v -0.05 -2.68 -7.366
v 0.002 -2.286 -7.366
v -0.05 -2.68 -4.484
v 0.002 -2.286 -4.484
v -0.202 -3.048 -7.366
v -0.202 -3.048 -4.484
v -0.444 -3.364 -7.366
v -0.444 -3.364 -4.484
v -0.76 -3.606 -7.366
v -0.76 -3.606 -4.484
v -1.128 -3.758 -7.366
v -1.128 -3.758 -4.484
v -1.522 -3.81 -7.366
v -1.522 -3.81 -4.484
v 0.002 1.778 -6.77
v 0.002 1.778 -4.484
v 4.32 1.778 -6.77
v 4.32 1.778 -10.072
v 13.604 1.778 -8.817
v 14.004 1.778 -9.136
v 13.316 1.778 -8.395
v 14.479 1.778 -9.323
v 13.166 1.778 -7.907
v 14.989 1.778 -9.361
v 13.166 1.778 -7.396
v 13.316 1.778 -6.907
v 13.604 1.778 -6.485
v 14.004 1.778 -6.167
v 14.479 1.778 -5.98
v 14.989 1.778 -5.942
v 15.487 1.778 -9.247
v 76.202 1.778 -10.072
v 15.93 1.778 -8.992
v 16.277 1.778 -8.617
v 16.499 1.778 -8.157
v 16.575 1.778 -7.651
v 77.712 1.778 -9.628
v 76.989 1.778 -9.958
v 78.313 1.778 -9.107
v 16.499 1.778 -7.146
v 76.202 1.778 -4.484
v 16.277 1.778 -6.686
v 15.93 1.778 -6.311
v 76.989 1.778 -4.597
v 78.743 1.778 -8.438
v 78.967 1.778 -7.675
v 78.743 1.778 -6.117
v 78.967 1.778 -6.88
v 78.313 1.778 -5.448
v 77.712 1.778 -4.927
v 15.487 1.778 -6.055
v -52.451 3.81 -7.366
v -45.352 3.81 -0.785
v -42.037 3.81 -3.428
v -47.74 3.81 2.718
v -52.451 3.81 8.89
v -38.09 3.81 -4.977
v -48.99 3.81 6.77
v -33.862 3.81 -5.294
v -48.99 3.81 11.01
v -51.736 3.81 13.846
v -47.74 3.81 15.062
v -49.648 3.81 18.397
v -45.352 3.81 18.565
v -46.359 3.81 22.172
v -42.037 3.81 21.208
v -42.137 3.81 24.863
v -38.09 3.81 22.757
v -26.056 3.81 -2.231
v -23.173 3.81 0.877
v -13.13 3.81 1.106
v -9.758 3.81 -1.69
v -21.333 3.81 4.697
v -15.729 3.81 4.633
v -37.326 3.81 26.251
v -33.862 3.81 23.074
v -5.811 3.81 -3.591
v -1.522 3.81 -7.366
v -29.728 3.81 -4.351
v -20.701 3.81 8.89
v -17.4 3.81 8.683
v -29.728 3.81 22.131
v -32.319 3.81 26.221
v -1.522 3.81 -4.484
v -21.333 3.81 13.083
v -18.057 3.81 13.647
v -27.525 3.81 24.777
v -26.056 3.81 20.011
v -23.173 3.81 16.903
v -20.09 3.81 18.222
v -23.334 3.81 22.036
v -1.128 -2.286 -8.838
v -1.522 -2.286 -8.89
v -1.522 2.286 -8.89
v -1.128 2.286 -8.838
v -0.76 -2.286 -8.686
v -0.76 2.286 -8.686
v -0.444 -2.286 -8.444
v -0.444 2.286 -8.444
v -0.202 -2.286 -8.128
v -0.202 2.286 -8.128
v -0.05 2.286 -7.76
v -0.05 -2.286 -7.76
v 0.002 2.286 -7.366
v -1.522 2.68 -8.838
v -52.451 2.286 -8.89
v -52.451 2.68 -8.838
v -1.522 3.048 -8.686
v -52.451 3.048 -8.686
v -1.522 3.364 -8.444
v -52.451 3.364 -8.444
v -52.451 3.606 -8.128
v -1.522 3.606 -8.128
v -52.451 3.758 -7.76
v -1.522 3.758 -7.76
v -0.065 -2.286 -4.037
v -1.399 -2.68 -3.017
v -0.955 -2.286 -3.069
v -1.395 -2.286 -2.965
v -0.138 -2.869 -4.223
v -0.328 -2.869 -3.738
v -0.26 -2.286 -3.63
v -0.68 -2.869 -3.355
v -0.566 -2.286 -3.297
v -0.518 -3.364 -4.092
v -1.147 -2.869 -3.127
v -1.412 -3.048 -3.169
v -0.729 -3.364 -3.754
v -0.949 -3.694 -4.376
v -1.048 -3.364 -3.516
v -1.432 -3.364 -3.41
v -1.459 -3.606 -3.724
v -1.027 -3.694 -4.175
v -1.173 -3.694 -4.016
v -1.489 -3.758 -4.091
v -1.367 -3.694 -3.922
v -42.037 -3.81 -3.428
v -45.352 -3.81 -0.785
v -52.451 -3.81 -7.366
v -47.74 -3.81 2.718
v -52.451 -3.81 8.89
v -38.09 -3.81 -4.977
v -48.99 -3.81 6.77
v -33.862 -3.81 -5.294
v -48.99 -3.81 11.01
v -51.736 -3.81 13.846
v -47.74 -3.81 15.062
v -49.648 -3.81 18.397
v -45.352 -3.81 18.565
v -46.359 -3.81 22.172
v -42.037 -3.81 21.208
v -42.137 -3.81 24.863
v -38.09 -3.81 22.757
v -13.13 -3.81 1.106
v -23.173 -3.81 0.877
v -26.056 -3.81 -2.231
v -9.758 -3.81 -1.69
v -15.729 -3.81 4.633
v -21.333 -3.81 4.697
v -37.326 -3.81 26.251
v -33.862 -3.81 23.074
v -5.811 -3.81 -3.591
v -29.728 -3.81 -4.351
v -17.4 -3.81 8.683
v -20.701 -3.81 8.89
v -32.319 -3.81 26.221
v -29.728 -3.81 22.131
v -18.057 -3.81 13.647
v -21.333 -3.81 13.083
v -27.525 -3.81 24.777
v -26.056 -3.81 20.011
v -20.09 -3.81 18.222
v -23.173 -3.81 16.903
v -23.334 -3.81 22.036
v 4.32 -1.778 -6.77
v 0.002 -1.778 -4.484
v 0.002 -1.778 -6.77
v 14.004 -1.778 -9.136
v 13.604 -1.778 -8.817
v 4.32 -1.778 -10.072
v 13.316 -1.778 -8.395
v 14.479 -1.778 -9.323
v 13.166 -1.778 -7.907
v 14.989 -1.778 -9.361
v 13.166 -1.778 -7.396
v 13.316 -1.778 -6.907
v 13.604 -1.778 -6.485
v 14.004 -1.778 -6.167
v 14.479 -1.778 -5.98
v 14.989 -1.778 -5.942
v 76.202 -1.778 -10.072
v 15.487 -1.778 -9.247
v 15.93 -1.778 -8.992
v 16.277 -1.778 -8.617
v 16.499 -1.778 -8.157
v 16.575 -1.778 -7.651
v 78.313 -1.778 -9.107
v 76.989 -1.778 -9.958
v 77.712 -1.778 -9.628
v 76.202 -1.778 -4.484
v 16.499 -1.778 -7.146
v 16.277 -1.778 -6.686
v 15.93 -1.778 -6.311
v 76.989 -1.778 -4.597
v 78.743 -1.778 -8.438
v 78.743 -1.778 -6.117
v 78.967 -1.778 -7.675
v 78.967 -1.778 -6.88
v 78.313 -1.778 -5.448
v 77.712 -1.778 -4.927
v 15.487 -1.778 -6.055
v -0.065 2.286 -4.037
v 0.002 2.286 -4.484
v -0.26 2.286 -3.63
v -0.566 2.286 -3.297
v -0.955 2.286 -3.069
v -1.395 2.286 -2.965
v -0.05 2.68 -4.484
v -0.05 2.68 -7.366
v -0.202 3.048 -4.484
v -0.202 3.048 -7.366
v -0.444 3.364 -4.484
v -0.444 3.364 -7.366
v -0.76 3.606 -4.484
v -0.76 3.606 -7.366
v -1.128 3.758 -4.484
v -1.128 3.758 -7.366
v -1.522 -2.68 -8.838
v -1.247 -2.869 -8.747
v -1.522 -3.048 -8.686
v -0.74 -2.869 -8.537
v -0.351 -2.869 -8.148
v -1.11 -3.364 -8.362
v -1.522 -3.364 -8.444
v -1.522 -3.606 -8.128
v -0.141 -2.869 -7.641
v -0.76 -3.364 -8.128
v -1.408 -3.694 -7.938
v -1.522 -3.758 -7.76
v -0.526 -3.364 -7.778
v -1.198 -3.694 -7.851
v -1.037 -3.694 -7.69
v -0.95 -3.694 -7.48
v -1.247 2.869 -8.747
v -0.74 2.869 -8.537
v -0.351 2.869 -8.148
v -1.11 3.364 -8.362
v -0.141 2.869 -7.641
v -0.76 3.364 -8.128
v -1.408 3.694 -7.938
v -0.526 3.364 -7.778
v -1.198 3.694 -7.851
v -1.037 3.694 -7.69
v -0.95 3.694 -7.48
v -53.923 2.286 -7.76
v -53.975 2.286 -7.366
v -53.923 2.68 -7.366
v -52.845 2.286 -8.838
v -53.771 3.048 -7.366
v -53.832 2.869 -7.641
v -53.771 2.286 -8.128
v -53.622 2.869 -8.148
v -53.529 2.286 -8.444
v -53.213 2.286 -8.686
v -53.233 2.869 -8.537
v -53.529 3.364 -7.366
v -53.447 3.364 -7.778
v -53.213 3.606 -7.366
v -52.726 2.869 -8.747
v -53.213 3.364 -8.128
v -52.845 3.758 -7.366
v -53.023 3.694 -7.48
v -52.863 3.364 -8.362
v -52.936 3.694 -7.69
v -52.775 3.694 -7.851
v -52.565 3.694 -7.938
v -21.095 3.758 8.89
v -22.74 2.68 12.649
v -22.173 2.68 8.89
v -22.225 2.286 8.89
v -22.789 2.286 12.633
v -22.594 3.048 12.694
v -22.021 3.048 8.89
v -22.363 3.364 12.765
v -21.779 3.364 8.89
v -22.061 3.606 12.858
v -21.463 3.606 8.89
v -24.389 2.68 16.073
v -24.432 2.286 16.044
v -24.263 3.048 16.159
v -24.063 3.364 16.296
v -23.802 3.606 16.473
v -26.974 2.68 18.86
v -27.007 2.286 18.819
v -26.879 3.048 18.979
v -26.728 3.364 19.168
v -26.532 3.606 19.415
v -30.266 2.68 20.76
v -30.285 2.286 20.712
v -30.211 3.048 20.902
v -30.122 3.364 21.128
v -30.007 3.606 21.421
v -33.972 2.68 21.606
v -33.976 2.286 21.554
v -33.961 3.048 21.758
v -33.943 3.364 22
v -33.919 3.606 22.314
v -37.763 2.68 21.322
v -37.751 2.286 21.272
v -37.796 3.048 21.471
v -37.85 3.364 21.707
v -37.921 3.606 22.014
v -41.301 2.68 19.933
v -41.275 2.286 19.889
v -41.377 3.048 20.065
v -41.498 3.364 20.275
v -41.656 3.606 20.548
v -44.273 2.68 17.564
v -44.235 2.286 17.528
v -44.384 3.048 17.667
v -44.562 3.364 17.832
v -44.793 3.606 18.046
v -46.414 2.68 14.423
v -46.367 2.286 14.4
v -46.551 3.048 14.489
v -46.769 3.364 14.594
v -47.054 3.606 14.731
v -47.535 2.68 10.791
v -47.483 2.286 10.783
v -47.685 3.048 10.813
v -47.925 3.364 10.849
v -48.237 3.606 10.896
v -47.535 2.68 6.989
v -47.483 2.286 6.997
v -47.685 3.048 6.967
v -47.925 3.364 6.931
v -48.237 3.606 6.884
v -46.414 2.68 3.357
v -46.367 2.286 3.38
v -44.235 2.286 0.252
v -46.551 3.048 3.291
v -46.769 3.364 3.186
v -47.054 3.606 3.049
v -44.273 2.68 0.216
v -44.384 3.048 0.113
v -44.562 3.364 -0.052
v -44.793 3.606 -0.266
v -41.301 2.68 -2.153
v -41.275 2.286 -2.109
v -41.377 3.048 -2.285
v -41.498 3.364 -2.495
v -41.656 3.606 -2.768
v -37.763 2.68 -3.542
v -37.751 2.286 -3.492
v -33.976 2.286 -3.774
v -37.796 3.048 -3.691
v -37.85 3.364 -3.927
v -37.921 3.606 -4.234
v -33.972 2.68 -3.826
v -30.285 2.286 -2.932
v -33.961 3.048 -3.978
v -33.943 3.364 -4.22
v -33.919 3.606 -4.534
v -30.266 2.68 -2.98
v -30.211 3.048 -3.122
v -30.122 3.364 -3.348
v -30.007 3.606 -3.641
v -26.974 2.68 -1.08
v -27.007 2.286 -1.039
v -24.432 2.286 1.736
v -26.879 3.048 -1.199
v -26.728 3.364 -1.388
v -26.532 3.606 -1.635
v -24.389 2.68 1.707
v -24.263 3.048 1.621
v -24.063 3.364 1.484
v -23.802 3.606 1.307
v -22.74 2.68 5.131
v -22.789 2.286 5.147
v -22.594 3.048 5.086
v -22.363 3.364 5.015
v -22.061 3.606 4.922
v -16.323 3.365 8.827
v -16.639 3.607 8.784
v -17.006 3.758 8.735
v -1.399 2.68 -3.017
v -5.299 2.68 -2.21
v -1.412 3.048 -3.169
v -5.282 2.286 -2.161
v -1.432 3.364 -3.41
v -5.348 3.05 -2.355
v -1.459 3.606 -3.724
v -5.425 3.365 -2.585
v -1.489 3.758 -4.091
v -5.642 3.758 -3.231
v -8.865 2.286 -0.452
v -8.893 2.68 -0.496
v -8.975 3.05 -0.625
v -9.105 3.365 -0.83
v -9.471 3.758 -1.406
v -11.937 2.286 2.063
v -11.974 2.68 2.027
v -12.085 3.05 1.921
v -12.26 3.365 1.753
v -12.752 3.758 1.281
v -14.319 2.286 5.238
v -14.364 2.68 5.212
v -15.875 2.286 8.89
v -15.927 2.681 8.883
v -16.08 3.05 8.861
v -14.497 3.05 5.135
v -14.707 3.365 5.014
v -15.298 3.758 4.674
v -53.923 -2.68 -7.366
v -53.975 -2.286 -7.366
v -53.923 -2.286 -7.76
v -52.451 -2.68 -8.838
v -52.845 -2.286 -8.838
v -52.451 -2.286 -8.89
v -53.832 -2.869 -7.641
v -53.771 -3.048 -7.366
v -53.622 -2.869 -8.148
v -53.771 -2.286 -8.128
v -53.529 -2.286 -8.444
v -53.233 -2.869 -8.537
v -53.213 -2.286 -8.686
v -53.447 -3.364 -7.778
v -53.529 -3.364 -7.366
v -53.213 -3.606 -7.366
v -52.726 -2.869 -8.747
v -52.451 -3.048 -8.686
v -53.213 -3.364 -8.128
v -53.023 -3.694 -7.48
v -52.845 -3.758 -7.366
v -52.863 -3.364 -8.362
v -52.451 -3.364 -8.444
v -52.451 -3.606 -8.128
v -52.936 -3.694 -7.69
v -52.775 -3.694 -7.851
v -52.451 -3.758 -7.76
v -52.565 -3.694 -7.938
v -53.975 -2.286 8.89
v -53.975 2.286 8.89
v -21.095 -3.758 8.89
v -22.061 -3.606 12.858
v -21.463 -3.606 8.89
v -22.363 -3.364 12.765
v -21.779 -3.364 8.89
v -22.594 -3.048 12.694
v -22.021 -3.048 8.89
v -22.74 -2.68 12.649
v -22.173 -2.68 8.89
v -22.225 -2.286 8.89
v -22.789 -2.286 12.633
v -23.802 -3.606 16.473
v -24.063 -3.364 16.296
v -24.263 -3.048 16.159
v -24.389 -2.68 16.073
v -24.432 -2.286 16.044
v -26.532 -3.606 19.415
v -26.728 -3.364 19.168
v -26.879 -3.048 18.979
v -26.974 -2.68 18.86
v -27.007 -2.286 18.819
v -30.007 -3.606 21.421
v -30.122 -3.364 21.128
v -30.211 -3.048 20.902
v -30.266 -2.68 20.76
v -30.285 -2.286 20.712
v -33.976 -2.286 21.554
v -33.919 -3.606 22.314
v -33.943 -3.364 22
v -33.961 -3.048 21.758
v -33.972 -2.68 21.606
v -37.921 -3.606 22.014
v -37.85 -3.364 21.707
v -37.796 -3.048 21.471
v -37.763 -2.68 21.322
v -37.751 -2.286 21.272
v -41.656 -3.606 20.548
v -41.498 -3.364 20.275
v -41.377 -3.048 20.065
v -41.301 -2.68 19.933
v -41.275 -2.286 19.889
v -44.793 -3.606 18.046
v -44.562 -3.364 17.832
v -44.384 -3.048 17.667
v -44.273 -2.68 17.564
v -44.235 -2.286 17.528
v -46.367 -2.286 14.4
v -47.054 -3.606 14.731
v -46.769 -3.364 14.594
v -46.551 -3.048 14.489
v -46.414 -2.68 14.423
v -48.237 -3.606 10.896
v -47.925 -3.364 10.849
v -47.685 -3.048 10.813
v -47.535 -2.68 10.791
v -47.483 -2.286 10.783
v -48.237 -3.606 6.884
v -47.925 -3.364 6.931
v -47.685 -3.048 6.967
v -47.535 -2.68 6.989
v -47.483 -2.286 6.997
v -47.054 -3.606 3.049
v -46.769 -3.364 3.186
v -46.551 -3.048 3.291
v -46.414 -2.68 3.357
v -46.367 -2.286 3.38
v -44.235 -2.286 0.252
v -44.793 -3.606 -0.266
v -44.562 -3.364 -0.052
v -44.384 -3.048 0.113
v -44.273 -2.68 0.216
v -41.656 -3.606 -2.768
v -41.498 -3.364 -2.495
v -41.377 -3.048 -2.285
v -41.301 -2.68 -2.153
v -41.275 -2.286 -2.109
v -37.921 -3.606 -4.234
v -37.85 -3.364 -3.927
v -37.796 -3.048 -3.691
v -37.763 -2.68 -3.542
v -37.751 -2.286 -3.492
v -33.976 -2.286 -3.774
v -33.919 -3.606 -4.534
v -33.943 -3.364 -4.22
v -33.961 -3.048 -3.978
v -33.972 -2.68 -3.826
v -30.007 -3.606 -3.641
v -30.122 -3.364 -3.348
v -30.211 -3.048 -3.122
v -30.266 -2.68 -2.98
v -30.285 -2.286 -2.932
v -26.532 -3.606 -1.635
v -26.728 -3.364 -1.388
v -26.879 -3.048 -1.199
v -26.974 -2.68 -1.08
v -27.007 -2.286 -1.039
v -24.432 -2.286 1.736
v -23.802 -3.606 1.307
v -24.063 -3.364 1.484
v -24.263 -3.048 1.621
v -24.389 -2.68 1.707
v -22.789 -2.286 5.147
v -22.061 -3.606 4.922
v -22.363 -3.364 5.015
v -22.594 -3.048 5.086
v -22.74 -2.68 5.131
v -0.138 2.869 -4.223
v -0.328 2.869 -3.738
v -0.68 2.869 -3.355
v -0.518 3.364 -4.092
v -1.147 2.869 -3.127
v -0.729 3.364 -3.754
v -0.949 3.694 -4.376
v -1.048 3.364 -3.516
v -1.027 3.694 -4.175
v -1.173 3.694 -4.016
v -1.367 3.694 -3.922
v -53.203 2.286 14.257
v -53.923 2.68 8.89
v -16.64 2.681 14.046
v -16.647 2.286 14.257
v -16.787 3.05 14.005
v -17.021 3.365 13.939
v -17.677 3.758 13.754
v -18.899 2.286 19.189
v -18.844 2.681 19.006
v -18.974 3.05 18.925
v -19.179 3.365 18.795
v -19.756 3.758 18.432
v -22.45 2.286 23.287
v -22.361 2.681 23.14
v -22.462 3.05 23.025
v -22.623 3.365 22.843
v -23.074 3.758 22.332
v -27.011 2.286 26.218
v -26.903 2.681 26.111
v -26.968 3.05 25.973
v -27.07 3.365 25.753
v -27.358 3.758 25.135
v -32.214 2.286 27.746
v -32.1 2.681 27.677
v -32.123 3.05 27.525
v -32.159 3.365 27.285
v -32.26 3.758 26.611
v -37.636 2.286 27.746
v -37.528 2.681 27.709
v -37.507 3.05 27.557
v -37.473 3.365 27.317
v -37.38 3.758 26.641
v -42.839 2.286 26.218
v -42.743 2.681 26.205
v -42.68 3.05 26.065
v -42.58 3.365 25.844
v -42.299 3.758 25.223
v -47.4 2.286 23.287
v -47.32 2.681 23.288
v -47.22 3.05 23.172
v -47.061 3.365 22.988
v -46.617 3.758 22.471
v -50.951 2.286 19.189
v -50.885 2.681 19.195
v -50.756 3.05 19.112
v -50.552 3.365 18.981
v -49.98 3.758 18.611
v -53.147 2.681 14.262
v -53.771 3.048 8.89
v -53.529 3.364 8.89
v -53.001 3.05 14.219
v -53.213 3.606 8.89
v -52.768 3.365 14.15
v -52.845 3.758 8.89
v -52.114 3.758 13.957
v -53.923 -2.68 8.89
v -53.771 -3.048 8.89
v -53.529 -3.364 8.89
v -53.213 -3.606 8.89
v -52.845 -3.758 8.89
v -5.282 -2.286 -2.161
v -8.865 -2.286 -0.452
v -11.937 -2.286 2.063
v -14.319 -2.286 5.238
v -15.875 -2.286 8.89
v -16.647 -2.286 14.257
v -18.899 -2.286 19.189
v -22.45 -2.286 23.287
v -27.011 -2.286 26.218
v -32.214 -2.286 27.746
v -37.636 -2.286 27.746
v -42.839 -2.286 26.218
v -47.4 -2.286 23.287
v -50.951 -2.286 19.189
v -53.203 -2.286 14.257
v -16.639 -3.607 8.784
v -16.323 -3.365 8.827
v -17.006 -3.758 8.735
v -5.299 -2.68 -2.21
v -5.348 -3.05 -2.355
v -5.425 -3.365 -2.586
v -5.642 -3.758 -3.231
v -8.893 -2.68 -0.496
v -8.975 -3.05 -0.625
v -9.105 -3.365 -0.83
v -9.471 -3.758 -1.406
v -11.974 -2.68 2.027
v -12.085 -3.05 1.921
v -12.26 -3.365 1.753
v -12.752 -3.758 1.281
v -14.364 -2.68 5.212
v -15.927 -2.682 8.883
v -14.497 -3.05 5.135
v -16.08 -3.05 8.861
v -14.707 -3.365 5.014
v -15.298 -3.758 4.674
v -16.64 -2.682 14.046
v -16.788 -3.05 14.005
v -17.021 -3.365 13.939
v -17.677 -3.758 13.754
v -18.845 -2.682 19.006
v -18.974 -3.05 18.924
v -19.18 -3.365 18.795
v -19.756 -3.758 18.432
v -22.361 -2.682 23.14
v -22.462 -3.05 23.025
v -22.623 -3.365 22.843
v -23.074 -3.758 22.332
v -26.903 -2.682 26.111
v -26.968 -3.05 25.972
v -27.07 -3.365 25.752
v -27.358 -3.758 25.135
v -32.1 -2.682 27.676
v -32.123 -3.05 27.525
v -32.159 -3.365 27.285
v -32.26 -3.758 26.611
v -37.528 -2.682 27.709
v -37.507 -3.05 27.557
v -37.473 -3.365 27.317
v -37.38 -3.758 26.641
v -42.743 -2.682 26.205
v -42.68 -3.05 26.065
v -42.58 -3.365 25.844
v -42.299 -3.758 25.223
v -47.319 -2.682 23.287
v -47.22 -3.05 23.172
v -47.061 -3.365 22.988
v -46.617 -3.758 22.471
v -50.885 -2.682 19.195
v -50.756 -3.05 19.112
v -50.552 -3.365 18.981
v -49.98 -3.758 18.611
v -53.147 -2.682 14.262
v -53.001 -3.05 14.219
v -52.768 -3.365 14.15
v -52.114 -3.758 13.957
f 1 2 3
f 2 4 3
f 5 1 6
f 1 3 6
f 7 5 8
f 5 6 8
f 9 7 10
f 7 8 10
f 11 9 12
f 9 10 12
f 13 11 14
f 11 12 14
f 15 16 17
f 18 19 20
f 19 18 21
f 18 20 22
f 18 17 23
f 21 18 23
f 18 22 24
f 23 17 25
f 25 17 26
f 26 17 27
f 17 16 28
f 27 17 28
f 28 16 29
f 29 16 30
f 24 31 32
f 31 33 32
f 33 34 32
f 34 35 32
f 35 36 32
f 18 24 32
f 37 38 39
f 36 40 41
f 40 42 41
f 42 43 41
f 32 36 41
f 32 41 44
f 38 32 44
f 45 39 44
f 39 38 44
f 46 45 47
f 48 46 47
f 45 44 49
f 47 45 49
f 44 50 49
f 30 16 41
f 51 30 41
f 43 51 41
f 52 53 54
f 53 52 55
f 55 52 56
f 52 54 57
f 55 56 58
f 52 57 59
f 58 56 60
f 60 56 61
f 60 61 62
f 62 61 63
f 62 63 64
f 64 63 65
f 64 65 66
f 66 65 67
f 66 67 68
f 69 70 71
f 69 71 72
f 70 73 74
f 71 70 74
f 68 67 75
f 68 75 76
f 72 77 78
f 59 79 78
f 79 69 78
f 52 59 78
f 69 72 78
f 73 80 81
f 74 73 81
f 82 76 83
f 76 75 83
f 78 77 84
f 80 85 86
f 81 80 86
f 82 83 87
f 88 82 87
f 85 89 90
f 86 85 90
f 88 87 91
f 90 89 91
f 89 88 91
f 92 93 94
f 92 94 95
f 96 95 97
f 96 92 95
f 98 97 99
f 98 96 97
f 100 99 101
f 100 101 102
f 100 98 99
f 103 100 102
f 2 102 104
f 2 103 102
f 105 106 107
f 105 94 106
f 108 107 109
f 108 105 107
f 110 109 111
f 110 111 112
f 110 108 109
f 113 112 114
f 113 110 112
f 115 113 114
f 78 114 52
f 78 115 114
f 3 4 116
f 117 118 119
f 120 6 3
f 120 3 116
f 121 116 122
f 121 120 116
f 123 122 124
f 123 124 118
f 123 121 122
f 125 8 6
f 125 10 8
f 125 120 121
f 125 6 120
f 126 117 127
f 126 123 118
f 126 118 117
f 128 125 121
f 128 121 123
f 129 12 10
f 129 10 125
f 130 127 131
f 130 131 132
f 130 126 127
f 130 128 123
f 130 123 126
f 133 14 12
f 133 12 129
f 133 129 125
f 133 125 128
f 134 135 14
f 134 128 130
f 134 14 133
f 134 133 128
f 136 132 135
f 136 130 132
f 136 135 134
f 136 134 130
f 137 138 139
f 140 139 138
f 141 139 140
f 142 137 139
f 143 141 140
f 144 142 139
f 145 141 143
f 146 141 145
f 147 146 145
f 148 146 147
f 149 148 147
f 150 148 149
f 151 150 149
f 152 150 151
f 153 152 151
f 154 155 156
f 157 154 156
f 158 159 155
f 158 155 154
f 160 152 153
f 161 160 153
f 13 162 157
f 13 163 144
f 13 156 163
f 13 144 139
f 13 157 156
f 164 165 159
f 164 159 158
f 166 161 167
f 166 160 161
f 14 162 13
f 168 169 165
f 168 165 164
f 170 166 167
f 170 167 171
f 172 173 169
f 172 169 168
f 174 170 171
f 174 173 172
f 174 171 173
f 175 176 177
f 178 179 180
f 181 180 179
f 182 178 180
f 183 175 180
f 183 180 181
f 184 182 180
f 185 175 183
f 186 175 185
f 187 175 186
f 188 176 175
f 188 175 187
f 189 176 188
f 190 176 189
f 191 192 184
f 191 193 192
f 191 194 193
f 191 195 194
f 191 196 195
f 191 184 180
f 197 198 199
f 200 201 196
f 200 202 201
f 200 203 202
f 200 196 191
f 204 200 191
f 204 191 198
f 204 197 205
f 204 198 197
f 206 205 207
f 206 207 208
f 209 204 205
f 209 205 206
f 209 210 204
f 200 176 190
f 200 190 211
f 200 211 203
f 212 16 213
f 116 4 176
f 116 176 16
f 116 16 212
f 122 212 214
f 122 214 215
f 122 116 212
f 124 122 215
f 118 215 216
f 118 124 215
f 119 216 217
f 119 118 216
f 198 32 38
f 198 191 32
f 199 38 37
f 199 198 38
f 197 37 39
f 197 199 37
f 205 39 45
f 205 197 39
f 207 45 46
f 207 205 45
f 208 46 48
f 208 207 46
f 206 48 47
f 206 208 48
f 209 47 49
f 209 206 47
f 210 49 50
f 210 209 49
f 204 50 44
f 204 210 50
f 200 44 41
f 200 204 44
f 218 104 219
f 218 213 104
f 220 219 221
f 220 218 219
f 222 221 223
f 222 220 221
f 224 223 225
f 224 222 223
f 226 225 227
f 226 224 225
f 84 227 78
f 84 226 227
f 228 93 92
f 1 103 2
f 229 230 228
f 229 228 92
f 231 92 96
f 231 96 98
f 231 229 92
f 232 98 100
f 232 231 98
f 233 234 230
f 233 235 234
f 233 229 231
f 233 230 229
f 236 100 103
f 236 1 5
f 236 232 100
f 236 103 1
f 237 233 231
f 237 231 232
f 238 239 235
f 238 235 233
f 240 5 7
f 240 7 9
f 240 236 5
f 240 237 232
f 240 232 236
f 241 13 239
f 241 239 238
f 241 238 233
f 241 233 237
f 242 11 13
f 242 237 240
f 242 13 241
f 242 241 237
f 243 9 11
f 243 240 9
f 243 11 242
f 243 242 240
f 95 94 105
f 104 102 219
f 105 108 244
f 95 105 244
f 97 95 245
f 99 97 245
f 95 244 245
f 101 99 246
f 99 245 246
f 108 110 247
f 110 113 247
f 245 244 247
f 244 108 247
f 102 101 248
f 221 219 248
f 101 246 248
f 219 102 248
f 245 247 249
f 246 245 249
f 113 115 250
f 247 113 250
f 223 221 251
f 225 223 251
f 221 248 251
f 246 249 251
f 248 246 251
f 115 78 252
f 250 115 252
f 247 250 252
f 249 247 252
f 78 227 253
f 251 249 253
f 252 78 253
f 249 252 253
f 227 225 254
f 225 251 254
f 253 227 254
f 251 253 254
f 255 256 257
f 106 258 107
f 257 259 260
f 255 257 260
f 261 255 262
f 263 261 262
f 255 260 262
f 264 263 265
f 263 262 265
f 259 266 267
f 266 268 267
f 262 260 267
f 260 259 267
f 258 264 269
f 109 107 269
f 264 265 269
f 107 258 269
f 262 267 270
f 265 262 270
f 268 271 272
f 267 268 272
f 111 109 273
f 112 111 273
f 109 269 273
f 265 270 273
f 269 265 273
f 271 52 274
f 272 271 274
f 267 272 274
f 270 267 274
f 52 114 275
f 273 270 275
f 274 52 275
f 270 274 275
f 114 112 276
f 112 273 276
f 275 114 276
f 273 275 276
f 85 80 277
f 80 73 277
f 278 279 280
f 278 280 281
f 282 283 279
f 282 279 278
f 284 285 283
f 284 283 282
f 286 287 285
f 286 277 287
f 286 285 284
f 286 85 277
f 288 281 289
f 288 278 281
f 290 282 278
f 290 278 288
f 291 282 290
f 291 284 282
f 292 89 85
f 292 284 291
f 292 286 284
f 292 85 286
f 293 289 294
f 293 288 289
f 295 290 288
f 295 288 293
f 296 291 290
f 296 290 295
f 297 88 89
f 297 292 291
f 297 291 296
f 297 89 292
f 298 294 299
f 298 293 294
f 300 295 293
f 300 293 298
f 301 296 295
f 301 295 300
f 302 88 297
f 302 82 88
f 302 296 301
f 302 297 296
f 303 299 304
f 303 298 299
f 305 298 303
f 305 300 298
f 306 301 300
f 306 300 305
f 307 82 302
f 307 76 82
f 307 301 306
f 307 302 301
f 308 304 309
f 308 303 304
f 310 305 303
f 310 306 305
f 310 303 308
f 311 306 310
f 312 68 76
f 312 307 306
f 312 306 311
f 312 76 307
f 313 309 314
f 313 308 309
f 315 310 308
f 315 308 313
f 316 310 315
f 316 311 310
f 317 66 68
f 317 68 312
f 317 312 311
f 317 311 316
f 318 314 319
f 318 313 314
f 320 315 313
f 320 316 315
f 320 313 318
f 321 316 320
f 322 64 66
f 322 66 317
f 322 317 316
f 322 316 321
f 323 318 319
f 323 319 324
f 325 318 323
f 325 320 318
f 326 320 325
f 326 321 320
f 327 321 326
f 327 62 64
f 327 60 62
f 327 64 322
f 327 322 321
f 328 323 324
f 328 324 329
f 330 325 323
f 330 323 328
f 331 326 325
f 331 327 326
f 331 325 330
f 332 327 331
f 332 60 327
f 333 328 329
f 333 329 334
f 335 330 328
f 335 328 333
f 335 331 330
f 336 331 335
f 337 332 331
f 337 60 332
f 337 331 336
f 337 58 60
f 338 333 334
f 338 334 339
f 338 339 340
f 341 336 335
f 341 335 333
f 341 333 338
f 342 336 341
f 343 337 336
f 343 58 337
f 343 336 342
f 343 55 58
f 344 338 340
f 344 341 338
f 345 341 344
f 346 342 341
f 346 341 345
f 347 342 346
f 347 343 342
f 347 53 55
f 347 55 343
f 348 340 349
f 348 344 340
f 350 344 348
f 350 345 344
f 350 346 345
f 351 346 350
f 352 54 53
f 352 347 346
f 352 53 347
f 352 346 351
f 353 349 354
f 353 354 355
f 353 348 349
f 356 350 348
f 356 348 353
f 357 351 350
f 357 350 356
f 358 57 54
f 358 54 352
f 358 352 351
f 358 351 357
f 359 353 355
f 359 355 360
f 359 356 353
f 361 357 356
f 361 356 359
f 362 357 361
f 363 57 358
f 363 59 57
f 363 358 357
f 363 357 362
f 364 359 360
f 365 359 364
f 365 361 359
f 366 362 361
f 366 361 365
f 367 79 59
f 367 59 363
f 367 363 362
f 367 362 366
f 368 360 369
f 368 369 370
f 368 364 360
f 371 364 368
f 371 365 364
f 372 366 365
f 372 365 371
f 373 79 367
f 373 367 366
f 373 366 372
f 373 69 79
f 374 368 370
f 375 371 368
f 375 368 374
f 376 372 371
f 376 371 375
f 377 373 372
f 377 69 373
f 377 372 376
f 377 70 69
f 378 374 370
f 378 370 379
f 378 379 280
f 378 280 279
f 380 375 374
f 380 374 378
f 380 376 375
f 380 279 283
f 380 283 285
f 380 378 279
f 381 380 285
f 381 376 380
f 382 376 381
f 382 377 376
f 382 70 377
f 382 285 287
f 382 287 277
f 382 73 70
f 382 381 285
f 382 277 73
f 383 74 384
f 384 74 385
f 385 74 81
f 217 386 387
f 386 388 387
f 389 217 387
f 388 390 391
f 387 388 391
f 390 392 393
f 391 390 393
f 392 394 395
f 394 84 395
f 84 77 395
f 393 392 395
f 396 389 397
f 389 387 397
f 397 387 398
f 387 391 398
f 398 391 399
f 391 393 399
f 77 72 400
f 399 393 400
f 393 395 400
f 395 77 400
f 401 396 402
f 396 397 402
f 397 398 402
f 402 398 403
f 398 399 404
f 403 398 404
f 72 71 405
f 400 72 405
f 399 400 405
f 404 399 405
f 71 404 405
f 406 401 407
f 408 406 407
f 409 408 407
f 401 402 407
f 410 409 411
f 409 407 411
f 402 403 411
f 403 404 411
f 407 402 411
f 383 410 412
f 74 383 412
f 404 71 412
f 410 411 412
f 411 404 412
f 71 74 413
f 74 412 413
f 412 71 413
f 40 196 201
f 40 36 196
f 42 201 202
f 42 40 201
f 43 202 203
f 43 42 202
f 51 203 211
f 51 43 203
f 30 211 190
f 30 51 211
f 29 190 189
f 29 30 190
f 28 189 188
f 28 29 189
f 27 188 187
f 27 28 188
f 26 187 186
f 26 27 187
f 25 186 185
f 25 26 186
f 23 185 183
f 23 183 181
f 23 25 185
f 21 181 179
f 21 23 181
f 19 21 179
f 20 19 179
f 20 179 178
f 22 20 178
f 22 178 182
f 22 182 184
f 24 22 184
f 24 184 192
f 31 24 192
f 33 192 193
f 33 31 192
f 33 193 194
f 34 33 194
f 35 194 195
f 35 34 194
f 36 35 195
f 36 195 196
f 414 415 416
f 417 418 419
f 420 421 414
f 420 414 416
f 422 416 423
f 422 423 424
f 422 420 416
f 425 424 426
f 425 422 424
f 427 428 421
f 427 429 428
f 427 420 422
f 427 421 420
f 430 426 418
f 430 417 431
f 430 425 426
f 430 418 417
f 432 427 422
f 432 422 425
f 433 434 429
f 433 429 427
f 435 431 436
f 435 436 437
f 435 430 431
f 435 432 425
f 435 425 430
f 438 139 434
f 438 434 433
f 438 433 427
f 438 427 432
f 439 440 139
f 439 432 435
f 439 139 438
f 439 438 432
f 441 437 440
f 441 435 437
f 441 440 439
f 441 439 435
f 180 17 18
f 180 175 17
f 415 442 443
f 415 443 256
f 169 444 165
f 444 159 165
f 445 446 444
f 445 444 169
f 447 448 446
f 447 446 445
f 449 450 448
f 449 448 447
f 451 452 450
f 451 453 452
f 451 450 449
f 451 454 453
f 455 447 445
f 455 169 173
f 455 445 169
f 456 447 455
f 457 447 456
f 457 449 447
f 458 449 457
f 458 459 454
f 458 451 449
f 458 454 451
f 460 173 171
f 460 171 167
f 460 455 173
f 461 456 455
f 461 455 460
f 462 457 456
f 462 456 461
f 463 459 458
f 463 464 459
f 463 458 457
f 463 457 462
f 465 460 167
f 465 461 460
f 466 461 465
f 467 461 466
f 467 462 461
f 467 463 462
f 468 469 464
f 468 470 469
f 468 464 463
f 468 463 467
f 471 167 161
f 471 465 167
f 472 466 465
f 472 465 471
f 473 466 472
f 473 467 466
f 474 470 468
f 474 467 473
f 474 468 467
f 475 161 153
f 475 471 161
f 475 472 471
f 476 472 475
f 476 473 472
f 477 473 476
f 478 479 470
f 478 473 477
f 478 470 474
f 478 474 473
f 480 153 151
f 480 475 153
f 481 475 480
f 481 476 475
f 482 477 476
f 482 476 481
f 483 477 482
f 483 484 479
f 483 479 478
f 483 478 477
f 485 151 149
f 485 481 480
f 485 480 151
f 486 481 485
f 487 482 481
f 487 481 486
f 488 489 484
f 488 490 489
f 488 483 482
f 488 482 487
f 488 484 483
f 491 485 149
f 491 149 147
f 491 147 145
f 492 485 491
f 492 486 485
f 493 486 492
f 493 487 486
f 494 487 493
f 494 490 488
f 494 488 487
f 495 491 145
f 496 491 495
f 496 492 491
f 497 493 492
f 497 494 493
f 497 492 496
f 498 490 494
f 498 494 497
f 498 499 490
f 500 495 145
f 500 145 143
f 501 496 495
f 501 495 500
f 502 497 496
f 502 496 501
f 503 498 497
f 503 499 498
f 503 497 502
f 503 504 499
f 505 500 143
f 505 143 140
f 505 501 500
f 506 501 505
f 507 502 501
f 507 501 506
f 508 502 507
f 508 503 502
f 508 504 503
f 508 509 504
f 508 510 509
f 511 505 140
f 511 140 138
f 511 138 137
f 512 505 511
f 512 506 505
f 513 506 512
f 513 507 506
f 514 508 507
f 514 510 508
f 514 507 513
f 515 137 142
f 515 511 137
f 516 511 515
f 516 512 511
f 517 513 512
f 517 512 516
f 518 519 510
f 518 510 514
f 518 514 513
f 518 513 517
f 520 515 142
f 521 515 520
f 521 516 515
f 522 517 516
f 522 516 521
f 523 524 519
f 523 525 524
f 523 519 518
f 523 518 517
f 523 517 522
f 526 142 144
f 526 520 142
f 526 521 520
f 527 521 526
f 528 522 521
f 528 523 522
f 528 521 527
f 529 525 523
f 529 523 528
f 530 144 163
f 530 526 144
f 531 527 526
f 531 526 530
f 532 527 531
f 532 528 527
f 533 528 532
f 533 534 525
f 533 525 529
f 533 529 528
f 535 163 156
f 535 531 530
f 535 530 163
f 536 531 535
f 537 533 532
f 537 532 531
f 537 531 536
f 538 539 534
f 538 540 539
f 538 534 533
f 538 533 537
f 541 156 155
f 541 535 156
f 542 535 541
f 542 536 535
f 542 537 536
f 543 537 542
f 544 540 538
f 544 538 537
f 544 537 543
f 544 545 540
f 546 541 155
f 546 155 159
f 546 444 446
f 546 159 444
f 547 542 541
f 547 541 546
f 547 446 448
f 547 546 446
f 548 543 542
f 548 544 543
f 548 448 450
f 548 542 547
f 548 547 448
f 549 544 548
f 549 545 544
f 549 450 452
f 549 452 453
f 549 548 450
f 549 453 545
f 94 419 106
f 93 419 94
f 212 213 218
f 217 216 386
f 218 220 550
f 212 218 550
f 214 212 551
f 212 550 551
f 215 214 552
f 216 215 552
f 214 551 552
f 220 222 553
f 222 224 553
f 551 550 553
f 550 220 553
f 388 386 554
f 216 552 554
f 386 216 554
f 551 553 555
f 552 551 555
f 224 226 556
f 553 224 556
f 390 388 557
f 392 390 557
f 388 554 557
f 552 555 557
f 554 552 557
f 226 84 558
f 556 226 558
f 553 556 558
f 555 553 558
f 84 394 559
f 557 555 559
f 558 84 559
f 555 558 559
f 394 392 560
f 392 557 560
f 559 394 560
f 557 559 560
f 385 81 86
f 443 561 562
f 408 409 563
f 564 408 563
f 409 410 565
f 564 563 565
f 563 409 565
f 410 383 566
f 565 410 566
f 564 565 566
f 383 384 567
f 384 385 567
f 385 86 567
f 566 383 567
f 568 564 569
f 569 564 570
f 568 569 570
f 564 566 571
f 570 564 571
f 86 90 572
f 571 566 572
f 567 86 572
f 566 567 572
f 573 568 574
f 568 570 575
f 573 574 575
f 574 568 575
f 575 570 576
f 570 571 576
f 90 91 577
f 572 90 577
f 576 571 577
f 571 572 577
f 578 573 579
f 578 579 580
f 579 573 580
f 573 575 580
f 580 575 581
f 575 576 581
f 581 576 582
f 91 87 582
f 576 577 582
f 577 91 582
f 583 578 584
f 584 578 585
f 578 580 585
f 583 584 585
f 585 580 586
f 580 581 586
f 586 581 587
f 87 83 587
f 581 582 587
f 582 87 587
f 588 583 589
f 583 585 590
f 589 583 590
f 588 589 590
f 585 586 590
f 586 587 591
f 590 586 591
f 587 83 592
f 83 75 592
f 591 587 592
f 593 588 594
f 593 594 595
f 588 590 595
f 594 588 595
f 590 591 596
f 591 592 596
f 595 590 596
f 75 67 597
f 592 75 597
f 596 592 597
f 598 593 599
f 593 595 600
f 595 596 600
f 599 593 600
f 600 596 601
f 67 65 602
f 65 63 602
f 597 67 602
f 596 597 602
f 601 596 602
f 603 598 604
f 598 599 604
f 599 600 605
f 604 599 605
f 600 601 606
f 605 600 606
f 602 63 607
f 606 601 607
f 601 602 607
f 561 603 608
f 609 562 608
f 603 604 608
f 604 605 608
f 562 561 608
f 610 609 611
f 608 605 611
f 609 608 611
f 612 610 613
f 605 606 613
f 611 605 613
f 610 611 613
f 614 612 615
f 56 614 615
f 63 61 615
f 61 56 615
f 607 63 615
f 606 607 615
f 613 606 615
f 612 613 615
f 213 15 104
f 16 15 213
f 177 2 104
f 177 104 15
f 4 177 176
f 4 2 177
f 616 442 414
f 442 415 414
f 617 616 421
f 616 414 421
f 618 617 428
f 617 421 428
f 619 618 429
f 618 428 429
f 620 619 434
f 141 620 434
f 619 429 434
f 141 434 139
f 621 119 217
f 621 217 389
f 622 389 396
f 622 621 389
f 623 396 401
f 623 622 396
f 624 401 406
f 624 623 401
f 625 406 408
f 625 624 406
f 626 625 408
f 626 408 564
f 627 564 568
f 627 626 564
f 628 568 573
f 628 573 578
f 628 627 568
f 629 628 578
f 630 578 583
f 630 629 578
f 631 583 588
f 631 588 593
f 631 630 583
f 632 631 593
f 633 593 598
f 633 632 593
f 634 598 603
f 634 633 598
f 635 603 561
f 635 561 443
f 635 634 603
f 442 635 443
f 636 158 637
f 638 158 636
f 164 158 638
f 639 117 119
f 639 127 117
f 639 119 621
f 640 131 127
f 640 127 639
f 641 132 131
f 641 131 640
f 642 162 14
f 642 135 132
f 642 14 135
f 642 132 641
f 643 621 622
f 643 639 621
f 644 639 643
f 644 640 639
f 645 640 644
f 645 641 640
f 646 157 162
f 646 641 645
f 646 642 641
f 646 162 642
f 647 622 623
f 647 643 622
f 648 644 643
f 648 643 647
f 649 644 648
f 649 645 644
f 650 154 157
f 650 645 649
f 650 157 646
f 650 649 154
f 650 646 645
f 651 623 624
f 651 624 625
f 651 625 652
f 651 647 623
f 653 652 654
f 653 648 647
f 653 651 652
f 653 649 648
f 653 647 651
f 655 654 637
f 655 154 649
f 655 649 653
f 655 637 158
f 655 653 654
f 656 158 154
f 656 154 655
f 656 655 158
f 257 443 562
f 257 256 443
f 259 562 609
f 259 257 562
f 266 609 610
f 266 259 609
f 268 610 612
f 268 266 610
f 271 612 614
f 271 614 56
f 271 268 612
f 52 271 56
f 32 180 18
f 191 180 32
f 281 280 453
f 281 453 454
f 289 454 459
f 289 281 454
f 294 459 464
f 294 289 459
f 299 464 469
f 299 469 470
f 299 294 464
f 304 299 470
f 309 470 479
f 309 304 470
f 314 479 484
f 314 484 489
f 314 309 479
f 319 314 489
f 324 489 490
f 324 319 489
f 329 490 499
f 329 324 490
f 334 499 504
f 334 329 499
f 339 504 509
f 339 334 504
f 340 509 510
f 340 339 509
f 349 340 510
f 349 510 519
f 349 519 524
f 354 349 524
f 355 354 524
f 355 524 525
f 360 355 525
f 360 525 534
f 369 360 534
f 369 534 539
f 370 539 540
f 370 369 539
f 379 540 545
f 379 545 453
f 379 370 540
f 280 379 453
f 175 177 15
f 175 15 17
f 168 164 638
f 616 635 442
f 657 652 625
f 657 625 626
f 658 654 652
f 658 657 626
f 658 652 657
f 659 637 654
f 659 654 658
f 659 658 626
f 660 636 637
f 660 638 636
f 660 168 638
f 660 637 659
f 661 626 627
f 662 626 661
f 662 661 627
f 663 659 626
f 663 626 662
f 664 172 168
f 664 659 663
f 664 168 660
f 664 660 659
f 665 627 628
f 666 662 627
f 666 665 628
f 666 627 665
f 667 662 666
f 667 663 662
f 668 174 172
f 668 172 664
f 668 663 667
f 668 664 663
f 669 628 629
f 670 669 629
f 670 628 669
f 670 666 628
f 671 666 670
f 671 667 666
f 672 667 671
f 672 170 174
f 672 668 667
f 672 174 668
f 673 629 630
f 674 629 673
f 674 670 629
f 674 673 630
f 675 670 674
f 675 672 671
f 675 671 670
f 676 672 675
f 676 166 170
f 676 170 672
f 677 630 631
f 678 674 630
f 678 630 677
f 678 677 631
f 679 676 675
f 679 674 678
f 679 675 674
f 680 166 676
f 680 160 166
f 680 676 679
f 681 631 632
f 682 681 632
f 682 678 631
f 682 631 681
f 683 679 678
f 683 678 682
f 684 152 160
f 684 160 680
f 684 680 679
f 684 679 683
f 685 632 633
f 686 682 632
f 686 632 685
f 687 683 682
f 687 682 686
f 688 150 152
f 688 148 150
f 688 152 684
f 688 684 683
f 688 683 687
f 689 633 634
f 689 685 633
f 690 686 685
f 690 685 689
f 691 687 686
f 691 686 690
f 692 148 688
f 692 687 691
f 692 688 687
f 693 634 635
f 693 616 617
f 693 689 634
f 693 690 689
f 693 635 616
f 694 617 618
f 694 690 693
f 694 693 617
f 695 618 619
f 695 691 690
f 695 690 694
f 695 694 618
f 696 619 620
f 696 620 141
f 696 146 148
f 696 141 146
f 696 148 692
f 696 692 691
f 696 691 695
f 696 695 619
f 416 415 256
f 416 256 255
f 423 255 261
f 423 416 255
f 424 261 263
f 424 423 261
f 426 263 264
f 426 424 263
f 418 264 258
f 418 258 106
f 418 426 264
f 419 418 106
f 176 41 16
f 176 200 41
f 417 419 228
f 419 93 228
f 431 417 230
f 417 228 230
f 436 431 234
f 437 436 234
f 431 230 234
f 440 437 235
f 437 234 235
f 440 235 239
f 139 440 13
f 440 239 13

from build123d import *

# Parameters (mm, degrees)
F0_R     = 12.7
F0_R_2   = 1.7145
F1_DEPTH = 1.778
F2_DEPTH = 3.81
F3_R     = 1.524


with BuildPart() as f1:
    # F0 (on Front) → F1 (new body, symmetric)
    with BuildSketch(Plane.XZ):
        with BuildLine():
            ThreePointArc((-15.875, 8.889999828), (-34.925, 27.939999828), (-53.975, 8.889999828))
            Line((-53.975, 8.889999828), (-53.975, -7.366000172))
            ThreePointArc((-53.975, -7.366000172), (-53.5286307345, -8.4436309065), (-52.451, -8.890000172))
            Line((-52.451, -8.890000172), (-1.5220896796, -8.890000172))
            ThreePointArc((-1.5220896796, -8.890000172), (-0.4444589451, -8.4436309065), (0.0019103204, -7.366000172))
            Line((0.0019103204, -7.366000172), (0.0019103204, -6.7696216721))
            Line((0.0019103204, -6.7696216721), (0.0019103204, -4.4836216721))
            ThreePointArc((0.0019103204, -4.4836216721), (-0.4004734297, -3.4520068765), (-1.3949844225, -2.9650883473))
            ThreePointArc((-1.3949844225, -2.9650883473), (-10.4768897023, 0.7127293809), (-15.875, 8.889999828))
        make_face()
        with Locations((-34.925, 8.889999828)):
            Circle(F0_R, mode=Mode.SUBTRACT)
        with BuildLine():
            Line((76.2019103204, -4.4836216721), (0.0019103204, -4.4836216721))
            Line((0.0019103204, -4.4836216721), (0.0019103204, -6.7696216721))
            Line((0.0019103204, -6.7696216721), (4.3199103204, -6.7696216721))
            Line((4.3199103204, -6.7696216721), (4.3199103204, -10.0716216721))
            Line((4.3199103204, -10.0716216721), (76.2019103204, -10.0716216721))
            ThreePointArc((76.2019103204, -10.0716216721), (78.9959103204, -7.2776216721), (76.2019103204, -4.4836216721))
        make_face()
        with Locations((14.8609103204, -7.6513164506)):
            Circle(F0_R_2, mode=Mode.SUBTRACT)
    extrude(amount=F1_DEPTH, both=True)

    # F0 (on Front) → F2 (join, symmetric)
    with BuildSketch(Plane.XZ):
        with BuildLine():
            ThreePointArc((-15.875, 8.889999828), (-34.925, 27.939999828), (-53.975, 8.889999828))
            Line((-53.975, 8.889999828), (-53.975, -7.366000172))
            ThreePointArc((-53.975, -7.366000172), (-53.5286307345, -8.4436309065), (-52.451, -8.890000172))
            Line((-52.451, -8.890000172), (-1.5220896796, -8.890000172))
            ThreePointArc((-1.5220896796, -8.890000172), (-0.4444589451, -8.4436309065), (0.0019103204, -7.366000172))
            Line((0.0019103204, -7.366000172), (0.0019103204, -6.7696216721))
            Line((0.0019103204, -6.7696216721), (0.0019103204, -4.4836216721))
            ThreePointArc((0.0019103204, -4.4836216721), (-0.4004734297, -3.4520068765), (-1.3949844225, -2.9650883473))
            ThreePointArc((-1.3949844225, -2.9650883473), (-10.4768897023, 0.7127293809), (-15.875, 8.889999828))
        make_face()
        with Locations((-34.925, 8.889999828)):
            Circle(F0_R, mode=Mode.SUBTRACT)
    extrude(amount=F2_DEPTH, both=True)

    # F3
    f3_edges = [f1.edges().sort_by_distance(p)[0] for p in [
        (-34.925, -3.81, 27.94),
        (-47.625, -3.81, 8.89),
        (-47.625, 3.81, 8.89),
        (-34.925, 3.81, 27.94),
    ]]
    fillet(f3_edges, radius=F3_R)


solid = f1.part
